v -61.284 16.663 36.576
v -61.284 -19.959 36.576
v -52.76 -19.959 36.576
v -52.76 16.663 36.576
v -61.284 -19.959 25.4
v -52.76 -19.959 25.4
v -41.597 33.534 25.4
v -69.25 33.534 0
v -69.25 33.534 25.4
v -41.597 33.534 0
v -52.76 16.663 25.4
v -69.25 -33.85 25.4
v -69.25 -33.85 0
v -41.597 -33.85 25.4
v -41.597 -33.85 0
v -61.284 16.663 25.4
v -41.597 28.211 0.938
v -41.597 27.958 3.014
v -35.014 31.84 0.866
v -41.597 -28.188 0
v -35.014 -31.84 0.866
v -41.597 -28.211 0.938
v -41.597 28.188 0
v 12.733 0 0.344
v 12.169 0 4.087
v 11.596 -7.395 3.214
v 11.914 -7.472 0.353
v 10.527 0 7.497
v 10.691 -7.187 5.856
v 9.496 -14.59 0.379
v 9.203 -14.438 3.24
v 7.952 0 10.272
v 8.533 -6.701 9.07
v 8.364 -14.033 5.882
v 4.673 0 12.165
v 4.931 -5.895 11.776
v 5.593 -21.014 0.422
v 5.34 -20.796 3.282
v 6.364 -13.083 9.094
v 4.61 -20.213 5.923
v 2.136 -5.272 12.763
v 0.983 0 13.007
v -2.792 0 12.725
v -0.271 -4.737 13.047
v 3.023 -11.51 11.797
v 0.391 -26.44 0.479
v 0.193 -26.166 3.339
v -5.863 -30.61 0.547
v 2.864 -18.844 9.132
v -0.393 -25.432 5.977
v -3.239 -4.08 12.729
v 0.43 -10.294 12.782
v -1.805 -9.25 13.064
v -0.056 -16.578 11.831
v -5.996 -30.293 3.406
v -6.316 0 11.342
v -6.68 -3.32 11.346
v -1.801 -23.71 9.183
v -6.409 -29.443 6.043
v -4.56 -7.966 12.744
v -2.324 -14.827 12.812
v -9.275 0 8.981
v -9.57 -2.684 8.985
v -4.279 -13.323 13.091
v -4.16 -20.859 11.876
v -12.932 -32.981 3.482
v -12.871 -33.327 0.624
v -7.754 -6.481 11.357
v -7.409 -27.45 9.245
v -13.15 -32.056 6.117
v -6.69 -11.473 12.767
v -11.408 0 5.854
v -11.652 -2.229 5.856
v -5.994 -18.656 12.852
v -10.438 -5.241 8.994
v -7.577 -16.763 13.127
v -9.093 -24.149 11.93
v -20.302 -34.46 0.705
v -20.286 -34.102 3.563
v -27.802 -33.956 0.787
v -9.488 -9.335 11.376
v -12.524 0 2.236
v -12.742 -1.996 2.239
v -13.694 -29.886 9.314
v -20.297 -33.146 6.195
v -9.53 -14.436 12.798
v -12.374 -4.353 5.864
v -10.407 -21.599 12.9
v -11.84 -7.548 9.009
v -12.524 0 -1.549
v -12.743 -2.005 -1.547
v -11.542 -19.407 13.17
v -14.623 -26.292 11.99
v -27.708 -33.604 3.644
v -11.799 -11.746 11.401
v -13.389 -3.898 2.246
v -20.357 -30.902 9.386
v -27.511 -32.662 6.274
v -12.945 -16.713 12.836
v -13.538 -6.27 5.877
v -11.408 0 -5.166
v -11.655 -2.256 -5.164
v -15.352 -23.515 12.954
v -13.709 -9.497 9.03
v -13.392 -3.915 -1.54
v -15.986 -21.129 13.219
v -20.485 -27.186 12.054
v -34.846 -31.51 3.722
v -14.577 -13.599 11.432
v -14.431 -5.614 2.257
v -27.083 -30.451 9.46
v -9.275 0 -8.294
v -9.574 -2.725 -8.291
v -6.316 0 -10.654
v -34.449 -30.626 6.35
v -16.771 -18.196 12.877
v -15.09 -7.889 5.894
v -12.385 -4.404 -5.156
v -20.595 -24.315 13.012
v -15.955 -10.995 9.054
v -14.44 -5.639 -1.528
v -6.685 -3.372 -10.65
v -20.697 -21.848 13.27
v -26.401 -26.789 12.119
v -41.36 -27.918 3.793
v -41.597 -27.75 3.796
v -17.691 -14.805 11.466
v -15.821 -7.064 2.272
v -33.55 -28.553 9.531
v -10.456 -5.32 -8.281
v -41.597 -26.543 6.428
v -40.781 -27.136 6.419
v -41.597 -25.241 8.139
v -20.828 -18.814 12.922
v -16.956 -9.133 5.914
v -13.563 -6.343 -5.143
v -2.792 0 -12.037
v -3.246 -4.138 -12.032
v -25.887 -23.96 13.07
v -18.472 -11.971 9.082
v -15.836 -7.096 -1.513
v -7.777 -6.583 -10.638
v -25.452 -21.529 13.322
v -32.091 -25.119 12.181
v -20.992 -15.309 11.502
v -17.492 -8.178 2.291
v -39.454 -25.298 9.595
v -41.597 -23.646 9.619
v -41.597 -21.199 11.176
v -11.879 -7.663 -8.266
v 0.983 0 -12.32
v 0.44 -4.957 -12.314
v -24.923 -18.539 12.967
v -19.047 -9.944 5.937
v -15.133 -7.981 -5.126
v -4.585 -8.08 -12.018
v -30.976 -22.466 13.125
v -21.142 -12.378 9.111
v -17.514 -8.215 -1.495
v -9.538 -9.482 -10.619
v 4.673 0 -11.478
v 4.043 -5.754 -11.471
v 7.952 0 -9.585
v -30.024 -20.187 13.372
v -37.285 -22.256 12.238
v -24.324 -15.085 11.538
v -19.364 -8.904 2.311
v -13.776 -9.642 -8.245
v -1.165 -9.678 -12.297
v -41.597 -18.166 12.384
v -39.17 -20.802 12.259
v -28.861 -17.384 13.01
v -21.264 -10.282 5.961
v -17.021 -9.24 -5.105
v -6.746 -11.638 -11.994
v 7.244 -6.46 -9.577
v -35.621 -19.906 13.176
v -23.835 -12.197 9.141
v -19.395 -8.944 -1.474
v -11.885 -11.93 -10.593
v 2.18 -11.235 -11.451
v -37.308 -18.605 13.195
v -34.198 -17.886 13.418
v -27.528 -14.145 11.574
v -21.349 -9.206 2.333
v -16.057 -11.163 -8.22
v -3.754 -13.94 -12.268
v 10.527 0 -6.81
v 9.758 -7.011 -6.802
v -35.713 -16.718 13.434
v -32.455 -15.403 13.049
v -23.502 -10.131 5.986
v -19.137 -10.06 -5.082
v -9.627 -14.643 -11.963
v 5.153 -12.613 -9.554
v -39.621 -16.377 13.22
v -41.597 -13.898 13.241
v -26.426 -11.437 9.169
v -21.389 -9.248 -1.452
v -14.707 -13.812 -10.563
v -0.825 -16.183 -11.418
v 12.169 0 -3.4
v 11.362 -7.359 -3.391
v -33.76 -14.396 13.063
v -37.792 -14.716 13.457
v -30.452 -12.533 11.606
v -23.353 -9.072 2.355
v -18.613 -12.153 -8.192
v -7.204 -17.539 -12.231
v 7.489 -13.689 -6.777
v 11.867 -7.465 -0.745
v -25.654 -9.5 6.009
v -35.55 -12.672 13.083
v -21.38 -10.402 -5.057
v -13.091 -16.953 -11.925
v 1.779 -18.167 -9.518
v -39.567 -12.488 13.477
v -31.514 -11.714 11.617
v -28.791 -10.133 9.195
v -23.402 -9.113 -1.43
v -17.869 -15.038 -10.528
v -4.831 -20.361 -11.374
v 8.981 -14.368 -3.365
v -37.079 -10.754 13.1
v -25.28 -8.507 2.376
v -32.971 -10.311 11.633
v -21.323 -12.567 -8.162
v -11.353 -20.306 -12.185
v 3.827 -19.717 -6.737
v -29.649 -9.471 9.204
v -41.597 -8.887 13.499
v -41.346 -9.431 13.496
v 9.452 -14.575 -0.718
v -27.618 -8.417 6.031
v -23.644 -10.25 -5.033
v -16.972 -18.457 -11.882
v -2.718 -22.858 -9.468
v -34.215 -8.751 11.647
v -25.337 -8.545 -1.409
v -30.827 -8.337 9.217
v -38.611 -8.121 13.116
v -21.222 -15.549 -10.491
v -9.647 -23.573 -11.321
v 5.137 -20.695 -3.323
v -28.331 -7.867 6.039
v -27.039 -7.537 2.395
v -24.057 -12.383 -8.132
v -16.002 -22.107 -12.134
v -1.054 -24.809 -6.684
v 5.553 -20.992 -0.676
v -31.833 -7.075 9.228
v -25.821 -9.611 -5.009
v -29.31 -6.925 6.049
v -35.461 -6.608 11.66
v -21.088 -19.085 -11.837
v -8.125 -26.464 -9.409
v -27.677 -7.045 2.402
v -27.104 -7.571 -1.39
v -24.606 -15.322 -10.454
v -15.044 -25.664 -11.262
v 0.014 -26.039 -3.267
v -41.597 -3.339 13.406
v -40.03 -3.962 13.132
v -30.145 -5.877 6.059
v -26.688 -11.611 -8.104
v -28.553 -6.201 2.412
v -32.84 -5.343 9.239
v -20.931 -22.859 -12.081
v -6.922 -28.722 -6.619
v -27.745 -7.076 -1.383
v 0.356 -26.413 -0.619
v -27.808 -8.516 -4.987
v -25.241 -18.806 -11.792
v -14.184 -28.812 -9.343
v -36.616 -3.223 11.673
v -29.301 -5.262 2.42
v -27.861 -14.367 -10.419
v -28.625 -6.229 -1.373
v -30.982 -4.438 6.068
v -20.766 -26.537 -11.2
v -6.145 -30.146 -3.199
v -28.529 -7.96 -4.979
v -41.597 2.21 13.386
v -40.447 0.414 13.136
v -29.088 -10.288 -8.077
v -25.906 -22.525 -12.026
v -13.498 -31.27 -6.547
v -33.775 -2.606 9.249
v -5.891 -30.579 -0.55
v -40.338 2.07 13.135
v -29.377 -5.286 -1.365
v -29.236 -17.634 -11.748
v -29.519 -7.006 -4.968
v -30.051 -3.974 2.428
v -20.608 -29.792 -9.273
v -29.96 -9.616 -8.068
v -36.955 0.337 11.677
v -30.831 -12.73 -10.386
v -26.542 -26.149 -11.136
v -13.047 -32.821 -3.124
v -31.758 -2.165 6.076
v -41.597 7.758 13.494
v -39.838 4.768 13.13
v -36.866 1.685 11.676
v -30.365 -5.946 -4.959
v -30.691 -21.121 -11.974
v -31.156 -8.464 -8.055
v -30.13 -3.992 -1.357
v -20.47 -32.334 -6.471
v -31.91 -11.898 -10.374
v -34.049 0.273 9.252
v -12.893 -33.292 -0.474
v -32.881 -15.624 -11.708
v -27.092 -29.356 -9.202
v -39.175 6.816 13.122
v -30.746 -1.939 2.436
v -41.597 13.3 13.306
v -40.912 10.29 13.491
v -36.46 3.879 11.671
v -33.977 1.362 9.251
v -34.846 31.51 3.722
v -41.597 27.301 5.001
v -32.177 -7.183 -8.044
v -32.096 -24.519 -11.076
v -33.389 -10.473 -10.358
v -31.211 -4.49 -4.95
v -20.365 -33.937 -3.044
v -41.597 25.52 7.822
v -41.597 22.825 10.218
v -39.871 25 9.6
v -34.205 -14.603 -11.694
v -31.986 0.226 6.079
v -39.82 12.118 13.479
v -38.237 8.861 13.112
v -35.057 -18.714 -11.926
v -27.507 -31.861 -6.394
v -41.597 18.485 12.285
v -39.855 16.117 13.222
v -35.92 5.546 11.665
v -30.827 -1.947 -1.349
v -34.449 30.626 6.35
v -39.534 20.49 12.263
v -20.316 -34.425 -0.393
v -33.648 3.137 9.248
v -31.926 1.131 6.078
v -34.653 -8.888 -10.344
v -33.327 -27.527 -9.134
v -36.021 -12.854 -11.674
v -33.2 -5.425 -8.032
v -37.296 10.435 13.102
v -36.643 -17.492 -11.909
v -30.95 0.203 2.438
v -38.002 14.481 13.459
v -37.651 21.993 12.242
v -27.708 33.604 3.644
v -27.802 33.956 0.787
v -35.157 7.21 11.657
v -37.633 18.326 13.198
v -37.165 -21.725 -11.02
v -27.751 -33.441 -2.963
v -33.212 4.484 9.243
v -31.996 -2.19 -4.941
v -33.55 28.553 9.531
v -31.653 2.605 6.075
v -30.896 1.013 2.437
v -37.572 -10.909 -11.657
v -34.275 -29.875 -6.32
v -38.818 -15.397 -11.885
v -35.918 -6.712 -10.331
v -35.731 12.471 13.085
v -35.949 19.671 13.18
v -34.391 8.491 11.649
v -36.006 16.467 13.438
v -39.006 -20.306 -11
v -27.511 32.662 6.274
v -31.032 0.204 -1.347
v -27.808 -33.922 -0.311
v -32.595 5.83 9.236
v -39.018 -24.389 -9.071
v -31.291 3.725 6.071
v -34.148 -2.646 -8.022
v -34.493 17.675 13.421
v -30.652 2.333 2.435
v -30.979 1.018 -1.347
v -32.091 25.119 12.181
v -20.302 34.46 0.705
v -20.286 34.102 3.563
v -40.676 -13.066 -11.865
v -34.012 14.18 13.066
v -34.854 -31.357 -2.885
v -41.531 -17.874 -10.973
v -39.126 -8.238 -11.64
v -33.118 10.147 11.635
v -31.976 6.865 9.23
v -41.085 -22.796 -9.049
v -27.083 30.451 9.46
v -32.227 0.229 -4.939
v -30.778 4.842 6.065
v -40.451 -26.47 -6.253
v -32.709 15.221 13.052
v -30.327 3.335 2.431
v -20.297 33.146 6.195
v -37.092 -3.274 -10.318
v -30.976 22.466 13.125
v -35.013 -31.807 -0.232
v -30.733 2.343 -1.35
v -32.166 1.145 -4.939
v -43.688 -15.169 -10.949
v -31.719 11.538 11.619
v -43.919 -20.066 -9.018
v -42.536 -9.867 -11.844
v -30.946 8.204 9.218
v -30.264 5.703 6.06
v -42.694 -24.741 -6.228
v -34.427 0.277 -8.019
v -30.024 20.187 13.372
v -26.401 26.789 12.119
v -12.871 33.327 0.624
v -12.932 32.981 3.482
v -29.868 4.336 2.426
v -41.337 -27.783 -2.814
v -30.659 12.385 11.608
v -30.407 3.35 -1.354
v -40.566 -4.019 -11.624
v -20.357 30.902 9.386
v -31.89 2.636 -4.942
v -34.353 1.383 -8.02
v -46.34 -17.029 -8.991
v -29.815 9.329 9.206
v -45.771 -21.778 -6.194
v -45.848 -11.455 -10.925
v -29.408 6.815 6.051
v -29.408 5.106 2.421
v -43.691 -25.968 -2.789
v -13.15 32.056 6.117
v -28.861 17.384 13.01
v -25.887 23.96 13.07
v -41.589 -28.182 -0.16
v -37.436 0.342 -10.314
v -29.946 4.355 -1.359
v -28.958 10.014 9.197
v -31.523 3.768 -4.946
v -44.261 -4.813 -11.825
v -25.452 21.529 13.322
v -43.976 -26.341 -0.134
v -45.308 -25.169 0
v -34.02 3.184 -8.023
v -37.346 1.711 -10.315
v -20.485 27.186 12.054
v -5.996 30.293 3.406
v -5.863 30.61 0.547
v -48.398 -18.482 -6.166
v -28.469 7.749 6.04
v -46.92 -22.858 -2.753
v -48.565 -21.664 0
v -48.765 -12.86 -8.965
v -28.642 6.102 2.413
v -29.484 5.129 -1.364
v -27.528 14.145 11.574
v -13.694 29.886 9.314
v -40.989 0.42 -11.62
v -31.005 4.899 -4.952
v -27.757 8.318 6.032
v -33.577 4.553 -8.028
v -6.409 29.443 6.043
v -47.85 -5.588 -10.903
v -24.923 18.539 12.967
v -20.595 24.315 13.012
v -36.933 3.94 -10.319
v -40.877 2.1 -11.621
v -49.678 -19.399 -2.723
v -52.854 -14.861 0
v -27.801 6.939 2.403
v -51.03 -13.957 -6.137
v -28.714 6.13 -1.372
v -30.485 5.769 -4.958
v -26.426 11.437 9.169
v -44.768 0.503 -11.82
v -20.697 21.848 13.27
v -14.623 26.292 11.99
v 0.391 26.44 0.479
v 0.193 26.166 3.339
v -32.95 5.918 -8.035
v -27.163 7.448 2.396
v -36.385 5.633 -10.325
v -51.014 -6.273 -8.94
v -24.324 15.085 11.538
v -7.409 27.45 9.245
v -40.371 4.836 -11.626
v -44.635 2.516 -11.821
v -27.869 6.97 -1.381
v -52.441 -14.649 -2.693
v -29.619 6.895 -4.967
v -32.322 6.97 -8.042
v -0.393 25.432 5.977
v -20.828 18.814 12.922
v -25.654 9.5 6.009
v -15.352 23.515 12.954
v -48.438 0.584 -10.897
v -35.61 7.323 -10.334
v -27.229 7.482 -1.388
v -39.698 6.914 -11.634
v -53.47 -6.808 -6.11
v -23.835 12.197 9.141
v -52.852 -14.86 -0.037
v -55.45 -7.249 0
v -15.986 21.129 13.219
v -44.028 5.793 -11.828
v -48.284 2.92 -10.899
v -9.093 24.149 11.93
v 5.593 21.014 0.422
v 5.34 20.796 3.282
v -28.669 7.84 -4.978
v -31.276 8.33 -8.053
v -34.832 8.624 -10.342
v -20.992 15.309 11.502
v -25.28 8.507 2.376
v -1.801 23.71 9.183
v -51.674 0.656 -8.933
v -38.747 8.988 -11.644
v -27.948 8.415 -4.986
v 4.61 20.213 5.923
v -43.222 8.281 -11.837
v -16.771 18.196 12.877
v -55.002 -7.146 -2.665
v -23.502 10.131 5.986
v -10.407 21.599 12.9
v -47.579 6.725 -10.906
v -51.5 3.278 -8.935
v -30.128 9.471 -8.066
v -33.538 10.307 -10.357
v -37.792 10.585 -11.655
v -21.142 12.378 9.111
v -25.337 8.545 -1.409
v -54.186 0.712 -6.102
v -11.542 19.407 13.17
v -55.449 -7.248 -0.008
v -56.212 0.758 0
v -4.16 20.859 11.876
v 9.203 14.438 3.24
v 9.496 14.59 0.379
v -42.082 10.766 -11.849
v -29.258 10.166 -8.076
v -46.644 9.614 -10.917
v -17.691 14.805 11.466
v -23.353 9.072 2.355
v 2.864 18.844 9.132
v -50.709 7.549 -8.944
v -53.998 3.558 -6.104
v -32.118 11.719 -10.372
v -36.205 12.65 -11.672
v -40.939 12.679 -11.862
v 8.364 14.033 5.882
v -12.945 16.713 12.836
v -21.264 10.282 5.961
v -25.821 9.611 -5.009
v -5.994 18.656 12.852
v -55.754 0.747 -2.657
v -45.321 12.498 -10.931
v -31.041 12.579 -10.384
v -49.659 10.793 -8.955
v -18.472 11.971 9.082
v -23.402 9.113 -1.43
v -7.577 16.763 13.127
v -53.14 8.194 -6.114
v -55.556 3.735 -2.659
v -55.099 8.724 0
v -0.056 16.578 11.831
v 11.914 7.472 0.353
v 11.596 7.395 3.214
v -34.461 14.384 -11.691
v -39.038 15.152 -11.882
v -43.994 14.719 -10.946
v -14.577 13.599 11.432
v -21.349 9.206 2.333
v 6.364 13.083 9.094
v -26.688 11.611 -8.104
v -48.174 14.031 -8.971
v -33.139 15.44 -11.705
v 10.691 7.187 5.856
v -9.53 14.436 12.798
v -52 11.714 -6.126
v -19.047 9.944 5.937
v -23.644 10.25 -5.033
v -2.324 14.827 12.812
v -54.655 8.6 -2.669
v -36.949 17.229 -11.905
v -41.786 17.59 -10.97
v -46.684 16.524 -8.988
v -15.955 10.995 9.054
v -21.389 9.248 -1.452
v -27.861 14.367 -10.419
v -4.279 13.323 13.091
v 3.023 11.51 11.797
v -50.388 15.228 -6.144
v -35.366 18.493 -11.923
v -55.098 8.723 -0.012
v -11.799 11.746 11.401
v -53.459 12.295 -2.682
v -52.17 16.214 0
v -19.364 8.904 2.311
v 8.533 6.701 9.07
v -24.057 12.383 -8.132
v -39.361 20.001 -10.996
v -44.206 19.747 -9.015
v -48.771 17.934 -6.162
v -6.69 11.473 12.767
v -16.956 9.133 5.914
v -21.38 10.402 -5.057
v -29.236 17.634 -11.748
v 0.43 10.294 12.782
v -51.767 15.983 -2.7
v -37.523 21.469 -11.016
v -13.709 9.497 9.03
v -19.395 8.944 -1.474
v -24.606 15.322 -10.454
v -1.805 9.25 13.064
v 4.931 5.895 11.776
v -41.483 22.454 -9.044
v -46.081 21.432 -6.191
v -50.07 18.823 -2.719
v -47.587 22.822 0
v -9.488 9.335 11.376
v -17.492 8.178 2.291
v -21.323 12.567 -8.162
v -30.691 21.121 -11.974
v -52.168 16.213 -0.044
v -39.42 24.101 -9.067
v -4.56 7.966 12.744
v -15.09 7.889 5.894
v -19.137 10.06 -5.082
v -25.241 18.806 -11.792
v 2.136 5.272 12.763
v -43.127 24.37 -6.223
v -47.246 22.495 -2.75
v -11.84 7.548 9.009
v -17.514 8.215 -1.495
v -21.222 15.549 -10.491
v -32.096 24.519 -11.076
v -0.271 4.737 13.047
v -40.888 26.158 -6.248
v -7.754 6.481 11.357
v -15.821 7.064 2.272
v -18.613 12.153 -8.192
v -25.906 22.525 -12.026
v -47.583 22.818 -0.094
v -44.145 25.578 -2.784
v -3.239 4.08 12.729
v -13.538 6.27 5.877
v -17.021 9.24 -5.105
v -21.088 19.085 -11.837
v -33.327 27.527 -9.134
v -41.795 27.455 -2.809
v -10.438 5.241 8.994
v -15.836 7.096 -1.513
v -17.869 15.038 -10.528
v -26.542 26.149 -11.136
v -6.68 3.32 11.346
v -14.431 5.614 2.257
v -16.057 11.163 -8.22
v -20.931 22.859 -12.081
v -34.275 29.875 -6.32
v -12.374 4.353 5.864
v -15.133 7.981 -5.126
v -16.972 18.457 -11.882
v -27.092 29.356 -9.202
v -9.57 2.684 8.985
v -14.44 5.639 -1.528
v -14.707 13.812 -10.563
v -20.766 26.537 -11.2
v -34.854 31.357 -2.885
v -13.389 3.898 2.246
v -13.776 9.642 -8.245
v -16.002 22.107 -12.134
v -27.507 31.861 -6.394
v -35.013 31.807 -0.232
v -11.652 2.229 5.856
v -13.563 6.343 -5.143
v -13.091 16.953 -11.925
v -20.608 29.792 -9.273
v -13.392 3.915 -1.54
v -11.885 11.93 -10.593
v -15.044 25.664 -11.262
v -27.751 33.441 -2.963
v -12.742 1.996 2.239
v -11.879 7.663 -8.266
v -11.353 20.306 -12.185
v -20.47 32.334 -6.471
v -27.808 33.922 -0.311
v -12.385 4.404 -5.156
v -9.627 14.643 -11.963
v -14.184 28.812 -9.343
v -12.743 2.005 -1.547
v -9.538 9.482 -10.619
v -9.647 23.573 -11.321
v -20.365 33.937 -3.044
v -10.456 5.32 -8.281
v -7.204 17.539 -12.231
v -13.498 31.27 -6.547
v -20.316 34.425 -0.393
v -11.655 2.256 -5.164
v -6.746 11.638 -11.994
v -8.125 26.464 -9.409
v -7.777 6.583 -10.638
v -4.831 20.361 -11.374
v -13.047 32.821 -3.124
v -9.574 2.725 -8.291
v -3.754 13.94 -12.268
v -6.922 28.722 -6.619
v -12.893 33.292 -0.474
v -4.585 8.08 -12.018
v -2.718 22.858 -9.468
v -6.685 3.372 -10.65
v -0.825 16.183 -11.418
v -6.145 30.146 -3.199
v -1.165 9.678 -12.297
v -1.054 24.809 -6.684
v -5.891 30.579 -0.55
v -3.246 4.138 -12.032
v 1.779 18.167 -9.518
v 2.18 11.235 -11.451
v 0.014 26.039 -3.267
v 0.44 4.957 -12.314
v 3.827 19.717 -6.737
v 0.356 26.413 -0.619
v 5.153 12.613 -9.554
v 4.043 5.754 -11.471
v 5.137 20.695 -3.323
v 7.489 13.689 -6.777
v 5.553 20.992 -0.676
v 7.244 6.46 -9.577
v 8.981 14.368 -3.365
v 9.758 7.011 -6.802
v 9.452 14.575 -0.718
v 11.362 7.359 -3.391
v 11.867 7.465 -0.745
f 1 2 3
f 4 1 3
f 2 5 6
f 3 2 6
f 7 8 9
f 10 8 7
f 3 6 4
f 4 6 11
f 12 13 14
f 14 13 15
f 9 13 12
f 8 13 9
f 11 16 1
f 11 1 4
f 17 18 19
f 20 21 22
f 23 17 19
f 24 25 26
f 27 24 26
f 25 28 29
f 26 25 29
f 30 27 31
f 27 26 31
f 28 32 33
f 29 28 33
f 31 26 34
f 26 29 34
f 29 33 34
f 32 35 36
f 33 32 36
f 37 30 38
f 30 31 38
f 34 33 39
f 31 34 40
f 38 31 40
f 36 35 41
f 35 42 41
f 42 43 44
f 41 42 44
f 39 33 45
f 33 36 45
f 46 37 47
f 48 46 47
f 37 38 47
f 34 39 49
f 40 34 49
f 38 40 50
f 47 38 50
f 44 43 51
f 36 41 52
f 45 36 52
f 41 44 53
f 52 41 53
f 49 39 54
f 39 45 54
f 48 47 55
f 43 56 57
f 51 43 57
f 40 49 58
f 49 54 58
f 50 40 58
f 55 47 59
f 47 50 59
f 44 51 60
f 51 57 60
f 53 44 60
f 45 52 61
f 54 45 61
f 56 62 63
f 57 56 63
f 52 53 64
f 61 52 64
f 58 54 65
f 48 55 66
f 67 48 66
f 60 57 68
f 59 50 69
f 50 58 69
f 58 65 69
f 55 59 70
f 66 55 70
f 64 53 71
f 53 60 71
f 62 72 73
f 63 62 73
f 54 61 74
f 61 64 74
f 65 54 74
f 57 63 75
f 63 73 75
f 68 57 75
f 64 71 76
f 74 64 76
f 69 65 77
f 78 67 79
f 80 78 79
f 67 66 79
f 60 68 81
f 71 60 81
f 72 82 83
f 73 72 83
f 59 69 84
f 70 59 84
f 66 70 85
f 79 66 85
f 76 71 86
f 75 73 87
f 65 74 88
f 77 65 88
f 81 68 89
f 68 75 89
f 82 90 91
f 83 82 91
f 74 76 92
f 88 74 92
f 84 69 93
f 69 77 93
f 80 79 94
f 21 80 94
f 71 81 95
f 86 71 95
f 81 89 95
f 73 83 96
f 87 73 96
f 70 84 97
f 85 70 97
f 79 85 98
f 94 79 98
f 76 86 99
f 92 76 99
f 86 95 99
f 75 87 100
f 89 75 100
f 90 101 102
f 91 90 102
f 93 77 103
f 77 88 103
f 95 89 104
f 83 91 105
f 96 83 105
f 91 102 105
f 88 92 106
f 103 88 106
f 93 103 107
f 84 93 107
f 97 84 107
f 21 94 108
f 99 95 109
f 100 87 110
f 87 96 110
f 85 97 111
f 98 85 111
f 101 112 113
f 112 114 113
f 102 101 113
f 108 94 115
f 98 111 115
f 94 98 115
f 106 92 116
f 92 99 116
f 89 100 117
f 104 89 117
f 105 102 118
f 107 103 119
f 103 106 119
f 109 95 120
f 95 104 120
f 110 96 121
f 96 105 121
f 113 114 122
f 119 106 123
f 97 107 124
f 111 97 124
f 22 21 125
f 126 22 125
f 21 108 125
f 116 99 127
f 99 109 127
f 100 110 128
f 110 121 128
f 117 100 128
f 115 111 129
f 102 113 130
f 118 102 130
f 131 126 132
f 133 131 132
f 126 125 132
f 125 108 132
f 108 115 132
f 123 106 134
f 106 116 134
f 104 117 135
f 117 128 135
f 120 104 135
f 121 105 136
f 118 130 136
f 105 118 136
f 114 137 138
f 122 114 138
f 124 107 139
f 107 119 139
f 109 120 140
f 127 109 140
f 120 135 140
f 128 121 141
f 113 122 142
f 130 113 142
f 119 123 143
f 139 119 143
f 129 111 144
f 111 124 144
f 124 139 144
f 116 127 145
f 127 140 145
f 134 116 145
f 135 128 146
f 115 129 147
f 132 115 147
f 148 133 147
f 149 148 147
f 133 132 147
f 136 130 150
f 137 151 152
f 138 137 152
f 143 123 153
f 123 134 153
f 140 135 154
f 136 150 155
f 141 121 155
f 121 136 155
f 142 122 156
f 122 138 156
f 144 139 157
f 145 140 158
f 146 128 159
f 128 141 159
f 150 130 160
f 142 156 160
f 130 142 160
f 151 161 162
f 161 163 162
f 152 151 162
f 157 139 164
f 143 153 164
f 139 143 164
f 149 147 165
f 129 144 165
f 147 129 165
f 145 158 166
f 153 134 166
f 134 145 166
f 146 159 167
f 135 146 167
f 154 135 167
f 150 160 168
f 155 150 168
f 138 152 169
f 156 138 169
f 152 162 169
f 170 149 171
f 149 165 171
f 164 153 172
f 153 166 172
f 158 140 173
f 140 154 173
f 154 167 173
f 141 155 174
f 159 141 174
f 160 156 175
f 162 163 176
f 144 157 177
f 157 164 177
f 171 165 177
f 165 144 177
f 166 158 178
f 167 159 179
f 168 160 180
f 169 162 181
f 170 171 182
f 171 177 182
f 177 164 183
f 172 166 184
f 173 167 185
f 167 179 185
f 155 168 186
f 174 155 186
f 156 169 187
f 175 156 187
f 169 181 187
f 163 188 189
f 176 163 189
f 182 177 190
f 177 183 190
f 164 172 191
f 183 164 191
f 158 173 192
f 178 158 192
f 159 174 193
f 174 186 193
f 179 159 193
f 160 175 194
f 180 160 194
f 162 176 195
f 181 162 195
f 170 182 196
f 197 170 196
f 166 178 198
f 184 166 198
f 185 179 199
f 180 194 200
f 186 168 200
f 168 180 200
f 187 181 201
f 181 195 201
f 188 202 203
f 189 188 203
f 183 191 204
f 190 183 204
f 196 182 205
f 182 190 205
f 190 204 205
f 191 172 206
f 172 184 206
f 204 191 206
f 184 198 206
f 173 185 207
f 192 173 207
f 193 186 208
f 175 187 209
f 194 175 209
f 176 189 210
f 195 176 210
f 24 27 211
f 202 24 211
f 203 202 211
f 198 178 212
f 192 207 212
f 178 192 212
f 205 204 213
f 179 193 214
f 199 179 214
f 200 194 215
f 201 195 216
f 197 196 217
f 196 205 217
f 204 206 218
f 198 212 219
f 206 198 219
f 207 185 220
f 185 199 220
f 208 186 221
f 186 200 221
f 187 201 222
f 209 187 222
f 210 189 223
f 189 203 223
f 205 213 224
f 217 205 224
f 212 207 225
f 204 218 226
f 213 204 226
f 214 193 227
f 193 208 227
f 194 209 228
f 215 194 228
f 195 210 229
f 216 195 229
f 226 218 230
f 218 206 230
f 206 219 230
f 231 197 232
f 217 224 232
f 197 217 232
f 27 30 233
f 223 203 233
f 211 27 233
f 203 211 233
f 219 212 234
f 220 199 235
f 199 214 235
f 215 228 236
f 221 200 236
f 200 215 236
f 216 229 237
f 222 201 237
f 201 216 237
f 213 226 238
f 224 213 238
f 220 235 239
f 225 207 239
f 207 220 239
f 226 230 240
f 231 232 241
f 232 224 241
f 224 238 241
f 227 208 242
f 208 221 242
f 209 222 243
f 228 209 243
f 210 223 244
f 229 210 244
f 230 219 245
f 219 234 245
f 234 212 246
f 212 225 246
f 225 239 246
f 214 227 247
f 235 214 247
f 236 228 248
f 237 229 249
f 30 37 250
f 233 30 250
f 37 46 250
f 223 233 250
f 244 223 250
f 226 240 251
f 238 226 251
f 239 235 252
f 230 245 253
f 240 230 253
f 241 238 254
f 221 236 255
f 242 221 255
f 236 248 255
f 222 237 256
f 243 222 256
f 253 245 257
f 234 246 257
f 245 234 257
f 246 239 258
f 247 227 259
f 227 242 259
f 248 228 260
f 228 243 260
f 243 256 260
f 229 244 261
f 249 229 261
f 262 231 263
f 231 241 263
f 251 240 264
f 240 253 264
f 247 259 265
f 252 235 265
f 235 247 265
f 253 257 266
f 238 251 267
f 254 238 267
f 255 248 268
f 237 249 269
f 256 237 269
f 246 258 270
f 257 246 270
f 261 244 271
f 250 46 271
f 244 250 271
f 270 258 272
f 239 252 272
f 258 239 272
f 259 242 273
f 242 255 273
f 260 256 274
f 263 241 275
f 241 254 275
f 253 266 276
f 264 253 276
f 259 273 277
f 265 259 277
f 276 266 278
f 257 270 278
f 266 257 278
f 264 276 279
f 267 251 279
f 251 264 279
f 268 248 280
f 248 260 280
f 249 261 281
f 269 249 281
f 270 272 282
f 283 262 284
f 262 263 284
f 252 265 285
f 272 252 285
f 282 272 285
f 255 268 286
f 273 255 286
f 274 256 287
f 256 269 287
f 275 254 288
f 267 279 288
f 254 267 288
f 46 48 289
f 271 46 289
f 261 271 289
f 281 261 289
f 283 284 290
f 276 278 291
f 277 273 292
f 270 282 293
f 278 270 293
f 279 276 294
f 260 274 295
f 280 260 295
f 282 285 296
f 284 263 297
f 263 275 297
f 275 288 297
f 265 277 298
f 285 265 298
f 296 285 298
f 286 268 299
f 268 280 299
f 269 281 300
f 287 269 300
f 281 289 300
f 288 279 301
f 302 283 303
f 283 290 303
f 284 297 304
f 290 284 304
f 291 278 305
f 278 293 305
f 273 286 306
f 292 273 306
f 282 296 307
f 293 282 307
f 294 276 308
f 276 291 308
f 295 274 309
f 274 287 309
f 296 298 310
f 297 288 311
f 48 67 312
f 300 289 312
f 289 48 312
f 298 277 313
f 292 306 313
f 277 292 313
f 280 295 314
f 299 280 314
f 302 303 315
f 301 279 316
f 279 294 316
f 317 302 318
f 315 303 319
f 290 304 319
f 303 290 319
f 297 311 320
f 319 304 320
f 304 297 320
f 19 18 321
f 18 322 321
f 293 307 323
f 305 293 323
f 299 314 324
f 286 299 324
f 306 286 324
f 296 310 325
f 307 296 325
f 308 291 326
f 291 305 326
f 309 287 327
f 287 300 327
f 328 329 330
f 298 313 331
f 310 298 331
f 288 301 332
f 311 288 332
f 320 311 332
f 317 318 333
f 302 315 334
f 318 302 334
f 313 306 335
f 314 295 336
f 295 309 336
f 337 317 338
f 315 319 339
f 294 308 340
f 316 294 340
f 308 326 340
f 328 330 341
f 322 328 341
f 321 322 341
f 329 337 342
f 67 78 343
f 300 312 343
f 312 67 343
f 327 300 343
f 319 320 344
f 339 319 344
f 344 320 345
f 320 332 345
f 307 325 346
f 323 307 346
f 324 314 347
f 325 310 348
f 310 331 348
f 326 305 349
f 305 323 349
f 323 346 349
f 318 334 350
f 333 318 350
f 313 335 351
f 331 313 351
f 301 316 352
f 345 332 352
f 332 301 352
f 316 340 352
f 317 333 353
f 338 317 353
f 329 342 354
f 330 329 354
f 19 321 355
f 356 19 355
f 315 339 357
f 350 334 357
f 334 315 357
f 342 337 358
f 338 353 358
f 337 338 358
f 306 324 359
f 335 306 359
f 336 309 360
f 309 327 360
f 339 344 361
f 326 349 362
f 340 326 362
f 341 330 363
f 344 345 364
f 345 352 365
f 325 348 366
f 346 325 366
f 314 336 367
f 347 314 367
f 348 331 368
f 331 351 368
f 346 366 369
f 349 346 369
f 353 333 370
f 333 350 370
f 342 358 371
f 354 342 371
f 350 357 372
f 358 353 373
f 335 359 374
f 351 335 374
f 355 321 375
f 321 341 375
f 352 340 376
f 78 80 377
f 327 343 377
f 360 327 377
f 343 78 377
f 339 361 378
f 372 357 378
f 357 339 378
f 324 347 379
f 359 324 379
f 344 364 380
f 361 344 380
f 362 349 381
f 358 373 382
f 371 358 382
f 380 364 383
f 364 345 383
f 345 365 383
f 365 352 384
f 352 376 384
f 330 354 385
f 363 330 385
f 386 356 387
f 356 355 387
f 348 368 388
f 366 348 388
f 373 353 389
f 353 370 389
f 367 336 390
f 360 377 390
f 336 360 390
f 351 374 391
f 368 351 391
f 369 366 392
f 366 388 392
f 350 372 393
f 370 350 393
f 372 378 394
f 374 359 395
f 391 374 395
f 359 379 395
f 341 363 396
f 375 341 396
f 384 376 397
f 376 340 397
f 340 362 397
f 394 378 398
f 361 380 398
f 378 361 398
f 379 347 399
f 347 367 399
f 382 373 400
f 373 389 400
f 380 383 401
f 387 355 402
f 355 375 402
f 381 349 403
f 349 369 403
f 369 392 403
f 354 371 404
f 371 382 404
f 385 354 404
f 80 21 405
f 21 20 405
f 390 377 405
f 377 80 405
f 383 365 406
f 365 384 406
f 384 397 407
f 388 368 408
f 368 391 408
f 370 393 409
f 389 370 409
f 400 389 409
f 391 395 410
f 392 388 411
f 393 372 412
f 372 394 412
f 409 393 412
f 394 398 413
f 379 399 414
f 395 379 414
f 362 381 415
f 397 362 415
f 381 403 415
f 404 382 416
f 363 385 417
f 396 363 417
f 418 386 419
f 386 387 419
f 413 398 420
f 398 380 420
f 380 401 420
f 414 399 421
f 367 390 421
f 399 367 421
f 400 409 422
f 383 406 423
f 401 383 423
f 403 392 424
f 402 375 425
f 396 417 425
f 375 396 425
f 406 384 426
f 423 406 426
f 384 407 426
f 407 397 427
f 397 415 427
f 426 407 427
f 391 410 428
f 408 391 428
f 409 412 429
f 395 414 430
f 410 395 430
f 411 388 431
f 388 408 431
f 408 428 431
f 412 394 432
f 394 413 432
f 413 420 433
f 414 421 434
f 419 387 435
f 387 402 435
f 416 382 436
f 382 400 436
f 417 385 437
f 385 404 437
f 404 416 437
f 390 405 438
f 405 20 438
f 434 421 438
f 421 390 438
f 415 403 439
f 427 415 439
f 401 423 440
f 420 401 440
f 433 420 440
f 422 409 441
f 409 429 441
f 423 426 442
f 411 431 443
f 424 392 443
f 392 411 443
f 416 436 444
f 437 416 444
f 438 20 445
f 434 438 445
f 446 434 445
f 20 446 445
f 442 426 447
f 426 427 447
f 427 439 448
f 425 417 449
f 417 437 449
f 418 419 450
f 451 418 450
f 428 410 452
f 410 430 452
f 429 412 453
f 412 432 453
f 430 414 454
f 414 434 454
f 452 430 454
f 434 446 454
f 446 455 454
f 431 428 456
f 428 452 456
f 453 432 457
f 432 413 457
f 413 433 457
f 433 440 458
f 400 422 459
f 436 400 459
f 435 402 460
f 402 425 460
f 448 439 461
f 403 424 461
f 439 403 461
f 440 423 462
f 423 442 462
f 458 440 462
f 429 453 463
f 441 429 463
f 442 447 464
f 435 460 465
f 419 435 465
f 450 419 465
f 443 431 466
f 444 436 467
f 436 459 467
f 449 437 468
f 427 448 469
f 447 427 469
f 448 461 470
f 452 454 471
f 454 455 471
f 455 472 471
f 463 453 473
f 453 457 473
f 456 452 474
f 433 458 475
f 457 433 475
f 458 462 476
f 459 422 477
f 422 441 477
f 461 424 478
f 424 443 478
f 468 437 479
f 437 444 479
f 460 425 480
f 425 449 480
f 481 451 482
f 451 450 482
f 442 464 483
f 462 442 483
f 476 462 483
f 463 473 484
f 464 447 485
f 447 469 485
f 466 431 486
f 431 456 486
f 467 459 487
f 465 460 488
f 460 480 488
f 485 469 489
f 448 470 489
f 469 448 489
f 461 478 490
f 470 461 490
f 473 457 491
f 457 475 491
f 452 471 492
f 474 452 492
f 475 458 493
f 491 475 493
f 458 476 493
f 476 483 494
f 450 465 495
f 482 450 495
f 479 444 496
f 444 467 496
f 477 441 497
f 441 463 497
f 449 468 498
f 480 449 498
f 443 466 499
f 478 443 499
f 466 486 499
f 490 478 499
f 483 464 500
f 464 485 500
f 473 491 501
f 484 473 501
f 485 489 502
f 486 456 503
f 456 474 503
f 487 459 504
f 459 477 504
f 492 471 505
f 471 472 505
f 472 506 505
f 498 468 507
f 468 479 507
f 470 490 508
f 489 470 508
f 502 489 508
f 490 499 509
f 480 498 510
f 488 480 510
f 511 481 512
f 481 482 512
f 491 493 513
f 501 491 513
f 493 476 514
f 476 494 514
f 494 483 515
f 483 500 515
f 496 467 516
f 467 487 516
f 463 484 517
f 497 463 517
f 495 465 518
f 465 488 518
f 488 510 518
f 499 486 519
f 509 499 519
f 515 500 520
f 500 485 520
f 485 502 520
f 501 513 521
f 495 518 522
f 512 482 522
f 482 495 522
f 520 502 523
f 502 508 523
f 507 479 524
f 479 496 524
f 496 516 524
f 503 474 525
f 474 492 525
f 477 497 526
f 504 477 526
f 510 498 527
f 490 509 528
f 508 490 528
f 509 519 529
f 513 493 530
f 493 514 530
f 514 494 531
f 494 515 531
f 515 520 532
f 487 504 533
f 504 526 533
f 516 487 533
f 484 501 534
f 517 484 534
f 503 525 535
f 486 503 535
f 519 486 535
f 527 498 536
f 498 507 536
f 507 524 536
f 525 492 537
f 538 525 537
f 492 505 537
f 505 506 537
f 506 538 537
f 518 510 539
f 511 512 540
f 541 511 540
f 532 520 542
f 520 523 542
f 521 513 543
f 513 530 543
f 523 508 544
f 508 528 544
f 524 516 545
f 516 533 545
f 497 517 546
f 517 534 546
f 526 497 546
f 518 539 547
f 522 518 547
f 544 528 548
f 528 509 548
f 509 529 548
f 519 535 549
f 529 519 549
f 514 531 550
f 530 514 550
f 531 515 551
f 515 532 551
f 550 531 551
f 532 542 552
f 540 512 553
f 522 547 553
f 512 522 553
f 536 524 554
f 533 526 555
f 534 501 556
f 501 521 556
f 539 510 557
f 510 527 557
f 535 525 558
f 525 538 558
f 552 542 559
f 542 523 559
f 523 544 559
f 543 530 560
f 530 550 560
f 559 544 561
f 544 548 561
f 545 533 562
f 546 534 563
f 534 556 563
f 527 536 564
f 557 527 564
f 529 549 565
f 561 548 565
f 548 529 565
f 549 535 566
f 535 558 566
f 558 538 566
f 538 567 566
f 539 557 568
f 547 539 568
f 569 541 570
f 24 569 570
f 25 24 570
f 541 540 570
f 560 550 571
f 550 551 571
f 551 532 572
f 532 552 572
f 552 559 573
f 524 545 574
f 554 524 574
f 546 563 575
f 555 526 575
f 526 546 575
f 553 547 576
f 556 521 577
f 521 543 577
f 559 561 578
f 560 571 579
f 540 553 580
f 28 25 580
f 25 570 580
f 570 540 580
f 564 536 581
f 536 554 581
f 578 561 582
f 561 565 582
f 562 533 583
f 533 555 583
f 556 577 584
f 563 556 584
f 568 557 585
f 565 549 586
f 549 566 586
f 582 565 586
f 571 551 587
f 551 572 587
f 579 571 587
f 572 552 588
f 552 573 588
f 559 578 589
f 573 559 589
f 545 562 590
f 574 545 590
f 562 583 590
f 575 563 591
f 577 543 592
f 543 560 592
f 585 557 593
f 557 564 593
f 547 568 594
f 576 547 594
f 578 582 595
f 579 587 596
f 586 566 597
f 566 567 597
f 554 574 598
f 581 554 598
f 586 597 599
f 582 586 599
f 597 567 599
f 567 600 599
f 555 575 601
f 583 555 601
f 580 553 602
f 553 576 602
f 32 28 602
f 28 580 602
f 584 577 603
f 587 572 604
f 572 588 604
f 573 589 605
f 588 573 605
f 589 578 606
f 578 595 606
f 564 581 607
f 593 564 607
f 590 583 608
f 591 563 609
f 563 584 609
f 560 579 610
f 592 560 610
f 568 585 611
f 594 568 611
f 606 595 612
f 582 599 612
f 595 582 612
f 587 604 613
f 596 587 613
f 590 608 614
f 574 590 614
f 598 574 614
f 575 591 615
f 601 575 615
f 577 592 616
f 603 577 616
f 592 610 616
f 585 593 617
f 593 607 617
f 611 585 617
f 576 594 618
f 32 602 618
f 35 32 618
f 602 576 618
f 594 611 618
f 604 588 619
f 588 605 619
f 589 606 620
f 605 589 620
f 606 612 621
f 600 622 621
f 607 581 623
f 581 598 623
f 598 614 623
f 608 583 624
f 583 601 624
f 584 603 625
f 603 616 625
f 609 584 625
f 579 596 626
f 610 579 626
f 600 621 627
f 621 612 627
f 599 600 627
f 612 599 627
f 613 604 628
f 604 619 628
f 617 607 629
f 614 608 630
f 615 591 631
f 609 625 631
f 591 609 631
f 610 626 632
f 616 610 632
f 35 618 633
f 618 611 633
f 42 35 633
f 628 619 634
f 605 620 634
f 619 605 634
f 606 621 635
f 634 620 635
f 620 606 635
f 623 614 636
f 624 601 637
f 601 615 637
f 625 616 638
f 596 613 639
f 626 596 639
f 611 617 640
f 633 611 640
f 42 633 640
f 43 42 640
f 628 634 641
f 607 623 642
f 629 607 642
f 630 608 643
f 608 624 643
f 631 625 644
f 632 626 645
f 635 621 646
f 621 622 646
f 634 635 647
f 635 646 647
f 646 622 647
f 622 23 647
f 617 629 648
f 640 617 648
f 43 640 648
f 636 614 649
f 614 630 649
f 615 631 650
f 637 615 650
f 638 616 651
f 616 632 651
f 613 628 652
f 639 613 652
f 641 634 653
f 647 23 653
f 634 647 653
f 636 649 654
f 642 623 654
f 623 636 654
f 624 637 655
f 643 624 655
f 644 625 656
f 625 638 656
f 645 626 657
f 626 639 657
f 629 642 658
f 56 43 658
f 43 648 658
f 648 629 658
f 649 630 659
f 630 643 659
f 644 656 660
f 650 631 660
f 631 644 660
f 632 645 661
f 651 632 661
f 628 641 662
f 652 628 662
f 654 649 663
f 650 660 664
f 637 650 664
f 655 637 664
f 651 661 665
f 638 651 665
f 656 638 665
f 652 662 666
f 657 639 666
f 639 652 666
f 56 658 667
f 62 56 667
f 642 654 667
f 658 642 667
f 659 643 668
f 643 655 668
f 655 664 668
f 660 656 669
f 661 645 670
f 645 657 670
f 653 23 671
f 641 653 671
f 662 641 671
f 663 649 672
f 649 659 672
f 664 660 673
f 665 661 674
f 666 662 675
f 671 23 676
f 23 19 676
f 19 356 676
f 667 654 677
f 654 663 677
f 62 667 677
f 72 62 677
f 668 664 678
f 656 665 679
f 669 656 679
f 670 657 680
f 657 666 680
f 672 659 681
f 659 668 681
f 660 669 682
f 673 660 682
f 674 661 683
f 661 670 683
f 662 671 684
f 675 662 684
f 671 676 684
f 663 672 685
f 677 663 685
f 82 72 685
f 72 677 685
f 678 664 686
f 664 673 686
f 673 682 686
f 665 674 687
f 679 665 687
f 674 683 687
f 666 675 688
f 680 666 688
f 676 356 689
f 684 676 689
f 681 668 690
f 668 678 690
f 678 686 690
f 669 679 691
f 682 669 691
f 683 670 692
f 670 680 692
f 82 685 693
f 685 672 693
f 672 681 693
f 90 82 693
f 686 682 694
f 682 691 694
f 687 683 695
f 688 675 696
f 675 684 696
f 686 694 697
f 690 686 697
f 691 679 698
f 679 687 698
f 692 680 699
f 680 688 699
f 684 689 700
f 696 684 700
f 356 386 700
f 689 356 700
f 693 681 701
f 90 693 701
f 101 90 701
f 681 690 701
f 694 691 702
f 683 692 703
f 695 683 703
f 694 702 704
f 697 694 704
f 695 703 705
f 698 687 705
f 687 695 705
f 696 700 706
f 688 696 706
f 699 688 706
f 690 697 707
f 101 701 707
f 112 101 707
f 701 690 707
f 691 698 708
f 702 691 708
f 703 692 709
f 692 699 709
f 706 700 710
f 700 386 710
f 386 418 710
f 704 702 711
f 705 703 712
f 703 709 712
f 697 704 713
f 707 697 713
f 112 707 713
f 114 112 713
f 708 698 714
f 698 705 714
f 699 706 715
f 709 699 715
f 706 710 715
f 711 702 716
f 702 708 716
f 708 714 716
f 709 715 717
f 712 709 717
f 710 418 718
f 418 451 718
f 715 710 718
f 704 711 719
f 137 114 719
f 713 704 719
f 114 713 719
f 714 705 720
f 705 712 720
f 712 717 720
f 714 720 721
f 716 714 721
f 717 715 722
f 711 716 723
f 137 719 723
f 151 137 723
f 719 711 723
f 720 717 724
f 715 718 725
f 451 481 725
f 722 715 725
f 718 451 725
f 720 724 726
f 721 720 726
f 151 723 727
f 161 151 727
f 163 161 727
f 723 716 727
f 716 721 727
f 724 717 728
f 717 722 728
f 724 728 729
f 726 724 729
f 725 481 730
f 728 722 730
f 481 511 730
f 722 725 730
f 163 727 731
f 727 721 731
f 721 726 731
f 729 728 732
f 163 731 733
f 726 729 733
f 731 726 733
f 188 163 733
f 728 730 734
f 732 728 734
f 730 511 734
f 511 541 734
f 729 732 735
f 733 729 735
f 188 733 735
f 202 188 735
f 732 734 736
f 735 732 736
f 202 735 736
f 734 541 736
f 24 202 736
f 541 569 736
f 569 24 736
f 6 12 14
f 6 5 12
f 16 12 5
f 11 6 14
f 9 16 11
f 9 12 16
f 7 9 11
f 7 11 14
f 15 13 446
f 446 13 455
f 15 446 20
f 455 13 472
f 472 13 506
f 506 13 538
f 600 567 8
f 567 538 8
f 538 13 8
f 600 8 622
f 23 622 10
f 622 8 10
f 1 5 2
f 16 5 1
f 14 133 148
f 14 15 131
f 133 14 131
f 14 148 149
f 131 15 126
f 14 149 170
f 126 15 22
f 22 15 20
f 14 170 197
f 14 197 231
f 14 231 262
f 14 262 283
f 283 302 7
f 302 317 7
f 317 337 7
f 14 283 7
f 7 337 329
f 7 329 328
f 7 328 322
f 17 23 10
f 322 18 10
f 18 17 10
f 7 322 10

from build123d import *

# Parameters (mm, degrees)
F0_R     = 12.699304
F3_W     = 27.652487
F3_H     = 67.384638
F4_DEPTH = 25.4
F5_W     = 8.52412
F5_H     = 36.622613
F6_DEPTH = 11.176


with BuildPart() as f2:
    # F0 (on Front) → F2 (revolve)
    with BuildSketch(Plane.XZ):
        with Locations((0.033883, 0.343613)):
            Circle(F0_R)
    revolve(axis=Axis((-22.052867, 0, -26.479952), (-0.010936, 0, -0.99994)))

    # F3 (on Top) → F4 (join)
    with BuildSketch(Plane.XY):
        with Locations((-55.423274, -0.157852)):
            Rectangle(F3_W, F3_H)
    extrude(amount=F4_DEPTH)

    # F5 (on face) → F6 (join)
    with BuildSketch(Plane.XY.offset(25.4)):
        with Locations((-57.021674, -1.647932)):
            Rectangle(F5_W, F5_H)
    extrude(amount=F6_DEPTH)


solid = f2.part
